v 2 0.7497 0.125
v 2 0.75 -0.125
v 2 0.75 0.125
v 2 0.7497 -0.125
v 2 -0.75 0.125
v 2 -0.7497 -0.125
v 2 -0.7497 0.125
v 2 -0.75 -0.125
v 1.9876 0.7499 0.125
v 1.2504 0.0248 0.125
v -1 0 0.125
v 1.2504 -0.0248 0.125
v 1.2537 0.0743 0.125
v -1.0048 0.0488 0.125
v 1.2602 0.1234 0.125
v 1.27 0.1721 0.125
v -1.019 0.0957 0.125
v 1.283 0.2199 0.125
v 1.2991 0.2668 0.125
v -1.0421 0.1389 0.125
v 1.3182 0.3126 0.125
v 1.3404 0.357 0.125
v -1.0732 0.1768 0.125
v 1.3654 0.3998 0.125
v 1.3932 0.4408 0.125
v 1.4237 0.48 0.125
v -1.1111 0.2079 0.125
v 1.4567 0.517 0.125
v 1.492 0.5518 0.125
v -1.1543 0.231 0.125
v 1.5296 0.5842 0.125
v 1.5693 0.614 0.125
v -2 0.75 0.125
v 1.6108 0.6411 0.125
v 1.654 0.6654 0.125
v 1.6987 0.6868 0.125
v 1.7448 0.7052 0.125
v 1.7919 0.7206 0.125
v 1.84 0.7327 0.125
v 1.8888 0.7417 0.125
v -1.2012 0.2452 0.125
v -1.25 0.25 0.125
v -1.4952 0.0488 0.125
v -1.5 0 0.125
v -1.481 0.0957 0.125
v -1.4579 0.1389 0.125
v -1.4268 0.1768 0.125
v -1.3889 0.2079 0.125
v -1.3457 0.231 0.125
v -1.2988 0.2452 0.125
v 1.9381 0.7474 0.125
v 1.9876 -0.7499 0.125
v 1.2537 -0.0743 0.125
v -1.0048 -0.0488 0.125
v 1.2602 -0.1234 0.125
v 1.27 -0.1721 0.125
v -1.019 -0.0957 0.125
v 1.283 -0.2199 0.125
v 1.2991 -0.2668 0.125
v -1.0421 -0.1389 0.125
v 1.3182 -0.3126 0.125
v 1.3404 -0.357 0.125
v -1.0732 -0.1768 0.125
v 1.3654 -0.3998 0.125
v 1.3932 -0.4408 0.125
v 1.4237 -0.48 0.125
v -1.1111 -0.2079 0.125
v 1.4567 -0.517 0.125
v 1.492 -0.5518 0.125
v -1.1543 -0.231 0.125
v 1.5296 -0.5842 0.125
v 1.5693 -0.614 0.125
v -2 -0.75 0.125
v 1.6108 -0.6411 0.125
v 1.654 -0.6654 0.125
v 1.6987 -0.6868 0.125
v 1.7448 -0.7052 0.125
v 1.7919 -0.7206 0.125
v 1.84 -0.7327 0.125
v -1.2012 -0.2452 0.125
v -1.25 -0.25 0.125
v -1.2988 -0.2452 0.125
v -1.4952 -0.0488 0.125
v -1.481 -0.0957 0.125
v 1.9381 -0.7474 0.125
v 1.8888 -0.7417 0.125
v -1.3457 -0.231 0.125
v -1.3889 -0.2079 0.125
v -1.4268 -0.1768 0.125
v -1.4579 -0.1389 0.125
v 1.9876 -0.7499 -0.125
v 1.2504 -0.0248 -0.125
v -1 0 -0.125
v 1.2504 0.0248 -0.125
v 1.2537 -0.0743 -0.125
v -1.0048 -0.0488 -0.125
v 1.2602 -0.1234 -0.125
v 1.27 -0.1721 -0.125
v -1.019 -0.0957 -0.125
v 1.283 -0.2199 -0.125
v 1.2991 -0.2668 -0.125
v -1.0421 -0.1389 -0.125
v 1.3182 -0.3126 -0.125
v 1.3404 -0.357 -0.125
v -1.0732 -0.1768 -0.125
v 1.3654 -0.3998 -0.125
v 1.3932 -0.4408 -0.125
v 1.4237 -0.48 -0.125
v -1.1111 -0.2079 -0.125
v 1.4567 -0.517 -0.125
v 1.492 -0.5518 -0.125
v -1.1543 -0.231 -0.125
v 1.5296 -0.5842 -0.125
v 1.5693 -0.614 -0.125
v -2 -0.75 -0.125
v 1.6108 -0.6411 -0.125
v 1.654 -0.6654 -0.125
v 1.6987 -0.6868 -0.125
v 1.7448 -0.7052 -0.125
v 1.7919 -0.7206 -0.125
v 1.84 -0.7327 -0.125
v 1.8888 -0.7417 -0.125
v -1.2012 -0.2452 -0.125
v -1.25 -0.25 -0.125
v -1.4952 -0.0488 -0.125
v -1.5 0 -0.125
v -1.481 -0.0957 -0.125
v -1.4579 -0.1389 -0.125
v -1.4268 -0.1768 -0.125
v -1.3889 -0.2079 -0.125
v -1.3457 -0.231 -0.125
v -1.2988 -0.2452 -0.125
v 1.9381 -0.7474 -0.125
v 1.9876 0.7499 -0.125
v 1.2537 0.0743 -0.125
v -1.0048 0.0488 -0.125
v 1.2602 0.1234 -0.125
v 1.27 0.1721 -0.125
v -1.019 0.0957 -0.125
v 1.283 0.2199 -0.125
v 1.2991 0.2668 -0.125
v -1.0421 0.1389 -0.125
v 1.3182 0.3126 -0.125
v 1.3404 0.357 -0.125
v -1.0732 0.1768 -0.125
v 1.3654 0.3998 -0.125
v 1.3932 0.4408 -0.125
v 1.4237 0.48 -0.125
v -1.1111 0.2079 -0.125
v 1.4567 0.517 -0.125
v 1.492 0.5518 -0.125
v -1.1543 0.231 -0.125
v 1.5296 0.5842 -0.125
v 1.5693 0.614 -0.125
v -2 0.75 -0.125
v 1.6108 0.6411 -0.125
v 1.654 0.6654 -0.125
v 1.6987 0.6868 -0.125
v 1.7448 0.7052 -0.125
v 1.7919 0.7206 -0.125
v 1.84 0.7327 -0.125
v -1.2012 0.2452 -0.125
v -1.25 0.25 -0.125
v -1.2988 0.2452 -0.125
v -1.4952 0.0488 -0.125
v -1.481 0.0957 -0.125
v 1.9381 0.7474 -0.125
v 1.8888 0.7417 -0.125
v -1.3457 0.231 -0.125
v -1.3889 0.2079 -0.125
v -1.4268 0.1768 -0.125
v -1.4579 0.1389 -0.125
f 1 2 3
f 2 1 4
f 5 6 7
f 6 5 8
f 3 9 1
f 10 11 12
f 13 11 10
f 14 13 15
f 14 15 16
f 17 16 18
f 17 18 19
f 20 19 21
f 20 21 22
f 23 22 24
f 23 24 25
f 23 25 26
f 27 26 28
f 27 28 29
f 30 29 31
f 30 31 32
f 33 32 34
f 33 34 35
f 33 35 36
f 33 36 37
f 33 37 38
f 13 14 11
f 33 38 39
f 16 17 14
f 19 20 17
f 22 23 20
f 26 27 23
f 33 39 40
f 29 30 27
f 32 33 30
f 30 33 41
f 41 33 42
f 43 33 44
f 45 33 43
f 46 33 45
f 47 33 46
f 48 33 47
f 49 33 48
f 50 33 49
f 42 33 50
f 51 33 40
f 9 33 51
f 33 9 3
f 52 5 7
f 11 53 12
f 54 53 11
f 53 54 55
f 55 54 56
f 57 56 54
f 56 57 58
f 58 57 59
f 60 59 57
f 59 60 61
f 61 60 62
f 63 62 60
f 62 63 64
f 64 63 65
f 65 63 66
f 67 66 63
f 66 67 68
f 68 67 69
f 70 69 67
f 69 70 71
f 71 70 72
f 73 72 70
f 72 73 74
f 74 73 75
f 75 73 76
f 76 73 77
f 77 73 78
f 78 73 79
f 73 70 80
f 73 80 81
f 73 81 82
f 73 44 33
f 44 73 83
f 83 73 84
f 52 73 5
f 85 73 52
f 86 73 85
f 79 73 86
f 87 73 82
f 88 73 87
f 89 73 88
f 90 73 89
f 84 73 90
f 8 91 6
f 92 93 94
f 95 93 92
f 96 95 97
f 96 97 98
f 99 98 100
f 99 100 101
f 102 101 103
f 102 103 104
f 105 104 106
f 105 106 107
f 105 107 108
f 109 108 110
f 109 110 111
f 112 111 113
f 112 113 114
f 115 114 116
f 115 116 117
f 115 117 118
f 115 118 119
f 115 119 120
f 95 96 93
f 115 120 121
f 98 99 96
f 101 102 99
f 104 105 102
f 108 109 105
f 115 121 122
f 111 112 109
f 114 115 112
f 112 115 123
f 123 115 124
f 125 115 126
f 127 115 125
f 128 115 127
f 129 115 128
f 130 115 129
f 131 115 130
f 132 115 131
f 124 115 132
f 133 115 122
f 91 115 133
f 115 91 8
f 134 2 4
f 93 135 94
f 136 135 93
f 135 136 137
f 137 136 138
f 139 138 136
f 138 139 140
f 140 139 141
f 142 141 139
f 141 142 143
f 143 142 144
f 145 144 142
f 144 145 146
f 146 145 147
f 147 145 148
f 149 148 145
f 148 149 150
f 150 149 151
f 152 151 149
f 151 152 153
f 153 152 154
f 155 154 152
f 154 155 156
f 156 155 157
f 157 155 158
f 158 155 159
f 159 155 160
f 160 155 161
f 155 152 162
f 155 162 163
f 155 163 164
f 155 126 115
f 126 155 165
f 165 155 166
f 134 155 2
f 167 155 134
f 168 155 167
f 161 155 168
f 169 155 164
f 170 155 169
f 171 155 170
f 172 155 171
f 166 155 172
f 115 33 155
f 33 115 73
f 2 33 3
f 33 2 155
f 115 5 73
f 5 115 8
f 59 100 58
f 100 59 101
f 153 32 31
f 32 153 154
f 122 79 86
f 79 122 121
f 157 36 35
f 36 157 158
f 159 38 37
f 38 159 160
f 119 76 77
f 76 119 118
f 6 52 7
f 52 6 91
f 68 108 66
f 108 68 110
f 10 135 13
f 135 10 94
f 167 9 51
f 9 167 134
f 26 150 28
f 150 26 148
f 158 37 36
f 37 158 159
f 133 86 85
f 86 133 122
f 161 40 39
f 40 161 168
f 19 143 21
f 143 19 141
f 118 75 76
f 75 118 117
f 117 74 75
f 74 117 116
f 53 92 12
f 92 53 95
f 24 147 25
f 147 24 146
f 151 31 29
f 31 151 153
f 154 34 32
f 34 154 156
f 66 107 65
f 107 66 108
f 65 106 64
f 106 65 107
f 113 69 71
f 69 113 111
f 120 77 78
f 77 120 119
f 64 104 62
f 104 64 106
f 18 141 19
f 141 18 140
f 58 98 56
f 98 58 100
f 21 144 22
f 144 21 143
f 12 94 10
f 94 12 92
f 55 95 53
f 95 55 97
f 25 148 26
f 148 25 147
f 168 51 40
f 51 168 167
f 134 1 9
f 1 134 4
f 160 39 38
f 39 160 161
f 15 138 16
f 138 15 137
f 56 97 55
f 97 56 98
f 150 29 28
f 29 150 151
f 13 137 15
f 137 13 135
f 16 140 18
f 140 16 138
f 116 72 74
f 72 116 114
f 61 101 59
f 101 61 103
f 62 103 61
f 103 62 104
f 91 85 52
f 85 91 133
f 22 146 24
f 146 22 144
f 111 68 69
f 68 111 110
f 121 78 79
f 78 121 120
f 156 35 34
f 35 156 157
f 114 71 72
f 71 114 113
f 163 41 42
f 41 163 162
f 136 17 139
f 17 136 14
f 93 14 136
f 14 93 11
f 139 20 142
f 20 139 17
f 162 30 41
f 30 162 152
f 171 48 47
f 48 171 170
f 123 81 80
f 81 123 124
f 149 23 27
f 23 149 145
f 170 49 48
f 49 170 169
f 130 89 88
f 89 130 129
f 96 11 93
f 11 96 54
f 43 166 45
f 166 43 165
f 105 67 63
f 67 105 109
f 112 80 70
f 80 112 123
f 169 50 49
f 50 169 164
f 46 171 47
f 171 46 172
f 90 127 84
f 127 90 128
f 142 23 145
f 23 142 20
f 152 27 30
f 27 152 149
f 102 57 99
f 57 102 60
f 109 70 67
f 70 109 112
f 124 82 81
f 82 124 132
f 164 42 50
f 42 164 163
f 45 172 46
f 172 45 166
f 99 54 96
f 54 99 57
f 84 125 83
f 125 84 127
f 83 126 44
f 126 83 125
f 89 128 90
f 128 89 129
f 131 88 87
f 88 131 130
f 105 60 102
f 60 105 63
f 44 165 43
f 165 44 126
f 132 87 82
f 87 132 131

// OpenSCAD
//QuickTab_Generator, generates tabs quickly

//things to add in v2
    //add unit conversions
    //add reduced weight setting
    //add taper
    //add web interface
       
//model setup 
$fa = 2;
$fs = 0.05;

//input dimensions

    //input dimensions
    tabDepth = 0.25;
    tabLength = 4;
    pipeDiameter = 1.5;
    holeDiameter = .5;
   
   
//compute positioning

difference(){
cube([tabLength,pipeDiameter,tabDepth], center = true);
translate([tabLength/2,0,0])
    cylinder(h = tabDepth + 0.1, d = pipeDiameter, center = true);
    
translate([-(tabLength/2) + pipeDiameter/2,0,0])
    cylinder(h = tabDepth + 0.1, d = holeDiameter, center = true);
}

echo("test echo");
